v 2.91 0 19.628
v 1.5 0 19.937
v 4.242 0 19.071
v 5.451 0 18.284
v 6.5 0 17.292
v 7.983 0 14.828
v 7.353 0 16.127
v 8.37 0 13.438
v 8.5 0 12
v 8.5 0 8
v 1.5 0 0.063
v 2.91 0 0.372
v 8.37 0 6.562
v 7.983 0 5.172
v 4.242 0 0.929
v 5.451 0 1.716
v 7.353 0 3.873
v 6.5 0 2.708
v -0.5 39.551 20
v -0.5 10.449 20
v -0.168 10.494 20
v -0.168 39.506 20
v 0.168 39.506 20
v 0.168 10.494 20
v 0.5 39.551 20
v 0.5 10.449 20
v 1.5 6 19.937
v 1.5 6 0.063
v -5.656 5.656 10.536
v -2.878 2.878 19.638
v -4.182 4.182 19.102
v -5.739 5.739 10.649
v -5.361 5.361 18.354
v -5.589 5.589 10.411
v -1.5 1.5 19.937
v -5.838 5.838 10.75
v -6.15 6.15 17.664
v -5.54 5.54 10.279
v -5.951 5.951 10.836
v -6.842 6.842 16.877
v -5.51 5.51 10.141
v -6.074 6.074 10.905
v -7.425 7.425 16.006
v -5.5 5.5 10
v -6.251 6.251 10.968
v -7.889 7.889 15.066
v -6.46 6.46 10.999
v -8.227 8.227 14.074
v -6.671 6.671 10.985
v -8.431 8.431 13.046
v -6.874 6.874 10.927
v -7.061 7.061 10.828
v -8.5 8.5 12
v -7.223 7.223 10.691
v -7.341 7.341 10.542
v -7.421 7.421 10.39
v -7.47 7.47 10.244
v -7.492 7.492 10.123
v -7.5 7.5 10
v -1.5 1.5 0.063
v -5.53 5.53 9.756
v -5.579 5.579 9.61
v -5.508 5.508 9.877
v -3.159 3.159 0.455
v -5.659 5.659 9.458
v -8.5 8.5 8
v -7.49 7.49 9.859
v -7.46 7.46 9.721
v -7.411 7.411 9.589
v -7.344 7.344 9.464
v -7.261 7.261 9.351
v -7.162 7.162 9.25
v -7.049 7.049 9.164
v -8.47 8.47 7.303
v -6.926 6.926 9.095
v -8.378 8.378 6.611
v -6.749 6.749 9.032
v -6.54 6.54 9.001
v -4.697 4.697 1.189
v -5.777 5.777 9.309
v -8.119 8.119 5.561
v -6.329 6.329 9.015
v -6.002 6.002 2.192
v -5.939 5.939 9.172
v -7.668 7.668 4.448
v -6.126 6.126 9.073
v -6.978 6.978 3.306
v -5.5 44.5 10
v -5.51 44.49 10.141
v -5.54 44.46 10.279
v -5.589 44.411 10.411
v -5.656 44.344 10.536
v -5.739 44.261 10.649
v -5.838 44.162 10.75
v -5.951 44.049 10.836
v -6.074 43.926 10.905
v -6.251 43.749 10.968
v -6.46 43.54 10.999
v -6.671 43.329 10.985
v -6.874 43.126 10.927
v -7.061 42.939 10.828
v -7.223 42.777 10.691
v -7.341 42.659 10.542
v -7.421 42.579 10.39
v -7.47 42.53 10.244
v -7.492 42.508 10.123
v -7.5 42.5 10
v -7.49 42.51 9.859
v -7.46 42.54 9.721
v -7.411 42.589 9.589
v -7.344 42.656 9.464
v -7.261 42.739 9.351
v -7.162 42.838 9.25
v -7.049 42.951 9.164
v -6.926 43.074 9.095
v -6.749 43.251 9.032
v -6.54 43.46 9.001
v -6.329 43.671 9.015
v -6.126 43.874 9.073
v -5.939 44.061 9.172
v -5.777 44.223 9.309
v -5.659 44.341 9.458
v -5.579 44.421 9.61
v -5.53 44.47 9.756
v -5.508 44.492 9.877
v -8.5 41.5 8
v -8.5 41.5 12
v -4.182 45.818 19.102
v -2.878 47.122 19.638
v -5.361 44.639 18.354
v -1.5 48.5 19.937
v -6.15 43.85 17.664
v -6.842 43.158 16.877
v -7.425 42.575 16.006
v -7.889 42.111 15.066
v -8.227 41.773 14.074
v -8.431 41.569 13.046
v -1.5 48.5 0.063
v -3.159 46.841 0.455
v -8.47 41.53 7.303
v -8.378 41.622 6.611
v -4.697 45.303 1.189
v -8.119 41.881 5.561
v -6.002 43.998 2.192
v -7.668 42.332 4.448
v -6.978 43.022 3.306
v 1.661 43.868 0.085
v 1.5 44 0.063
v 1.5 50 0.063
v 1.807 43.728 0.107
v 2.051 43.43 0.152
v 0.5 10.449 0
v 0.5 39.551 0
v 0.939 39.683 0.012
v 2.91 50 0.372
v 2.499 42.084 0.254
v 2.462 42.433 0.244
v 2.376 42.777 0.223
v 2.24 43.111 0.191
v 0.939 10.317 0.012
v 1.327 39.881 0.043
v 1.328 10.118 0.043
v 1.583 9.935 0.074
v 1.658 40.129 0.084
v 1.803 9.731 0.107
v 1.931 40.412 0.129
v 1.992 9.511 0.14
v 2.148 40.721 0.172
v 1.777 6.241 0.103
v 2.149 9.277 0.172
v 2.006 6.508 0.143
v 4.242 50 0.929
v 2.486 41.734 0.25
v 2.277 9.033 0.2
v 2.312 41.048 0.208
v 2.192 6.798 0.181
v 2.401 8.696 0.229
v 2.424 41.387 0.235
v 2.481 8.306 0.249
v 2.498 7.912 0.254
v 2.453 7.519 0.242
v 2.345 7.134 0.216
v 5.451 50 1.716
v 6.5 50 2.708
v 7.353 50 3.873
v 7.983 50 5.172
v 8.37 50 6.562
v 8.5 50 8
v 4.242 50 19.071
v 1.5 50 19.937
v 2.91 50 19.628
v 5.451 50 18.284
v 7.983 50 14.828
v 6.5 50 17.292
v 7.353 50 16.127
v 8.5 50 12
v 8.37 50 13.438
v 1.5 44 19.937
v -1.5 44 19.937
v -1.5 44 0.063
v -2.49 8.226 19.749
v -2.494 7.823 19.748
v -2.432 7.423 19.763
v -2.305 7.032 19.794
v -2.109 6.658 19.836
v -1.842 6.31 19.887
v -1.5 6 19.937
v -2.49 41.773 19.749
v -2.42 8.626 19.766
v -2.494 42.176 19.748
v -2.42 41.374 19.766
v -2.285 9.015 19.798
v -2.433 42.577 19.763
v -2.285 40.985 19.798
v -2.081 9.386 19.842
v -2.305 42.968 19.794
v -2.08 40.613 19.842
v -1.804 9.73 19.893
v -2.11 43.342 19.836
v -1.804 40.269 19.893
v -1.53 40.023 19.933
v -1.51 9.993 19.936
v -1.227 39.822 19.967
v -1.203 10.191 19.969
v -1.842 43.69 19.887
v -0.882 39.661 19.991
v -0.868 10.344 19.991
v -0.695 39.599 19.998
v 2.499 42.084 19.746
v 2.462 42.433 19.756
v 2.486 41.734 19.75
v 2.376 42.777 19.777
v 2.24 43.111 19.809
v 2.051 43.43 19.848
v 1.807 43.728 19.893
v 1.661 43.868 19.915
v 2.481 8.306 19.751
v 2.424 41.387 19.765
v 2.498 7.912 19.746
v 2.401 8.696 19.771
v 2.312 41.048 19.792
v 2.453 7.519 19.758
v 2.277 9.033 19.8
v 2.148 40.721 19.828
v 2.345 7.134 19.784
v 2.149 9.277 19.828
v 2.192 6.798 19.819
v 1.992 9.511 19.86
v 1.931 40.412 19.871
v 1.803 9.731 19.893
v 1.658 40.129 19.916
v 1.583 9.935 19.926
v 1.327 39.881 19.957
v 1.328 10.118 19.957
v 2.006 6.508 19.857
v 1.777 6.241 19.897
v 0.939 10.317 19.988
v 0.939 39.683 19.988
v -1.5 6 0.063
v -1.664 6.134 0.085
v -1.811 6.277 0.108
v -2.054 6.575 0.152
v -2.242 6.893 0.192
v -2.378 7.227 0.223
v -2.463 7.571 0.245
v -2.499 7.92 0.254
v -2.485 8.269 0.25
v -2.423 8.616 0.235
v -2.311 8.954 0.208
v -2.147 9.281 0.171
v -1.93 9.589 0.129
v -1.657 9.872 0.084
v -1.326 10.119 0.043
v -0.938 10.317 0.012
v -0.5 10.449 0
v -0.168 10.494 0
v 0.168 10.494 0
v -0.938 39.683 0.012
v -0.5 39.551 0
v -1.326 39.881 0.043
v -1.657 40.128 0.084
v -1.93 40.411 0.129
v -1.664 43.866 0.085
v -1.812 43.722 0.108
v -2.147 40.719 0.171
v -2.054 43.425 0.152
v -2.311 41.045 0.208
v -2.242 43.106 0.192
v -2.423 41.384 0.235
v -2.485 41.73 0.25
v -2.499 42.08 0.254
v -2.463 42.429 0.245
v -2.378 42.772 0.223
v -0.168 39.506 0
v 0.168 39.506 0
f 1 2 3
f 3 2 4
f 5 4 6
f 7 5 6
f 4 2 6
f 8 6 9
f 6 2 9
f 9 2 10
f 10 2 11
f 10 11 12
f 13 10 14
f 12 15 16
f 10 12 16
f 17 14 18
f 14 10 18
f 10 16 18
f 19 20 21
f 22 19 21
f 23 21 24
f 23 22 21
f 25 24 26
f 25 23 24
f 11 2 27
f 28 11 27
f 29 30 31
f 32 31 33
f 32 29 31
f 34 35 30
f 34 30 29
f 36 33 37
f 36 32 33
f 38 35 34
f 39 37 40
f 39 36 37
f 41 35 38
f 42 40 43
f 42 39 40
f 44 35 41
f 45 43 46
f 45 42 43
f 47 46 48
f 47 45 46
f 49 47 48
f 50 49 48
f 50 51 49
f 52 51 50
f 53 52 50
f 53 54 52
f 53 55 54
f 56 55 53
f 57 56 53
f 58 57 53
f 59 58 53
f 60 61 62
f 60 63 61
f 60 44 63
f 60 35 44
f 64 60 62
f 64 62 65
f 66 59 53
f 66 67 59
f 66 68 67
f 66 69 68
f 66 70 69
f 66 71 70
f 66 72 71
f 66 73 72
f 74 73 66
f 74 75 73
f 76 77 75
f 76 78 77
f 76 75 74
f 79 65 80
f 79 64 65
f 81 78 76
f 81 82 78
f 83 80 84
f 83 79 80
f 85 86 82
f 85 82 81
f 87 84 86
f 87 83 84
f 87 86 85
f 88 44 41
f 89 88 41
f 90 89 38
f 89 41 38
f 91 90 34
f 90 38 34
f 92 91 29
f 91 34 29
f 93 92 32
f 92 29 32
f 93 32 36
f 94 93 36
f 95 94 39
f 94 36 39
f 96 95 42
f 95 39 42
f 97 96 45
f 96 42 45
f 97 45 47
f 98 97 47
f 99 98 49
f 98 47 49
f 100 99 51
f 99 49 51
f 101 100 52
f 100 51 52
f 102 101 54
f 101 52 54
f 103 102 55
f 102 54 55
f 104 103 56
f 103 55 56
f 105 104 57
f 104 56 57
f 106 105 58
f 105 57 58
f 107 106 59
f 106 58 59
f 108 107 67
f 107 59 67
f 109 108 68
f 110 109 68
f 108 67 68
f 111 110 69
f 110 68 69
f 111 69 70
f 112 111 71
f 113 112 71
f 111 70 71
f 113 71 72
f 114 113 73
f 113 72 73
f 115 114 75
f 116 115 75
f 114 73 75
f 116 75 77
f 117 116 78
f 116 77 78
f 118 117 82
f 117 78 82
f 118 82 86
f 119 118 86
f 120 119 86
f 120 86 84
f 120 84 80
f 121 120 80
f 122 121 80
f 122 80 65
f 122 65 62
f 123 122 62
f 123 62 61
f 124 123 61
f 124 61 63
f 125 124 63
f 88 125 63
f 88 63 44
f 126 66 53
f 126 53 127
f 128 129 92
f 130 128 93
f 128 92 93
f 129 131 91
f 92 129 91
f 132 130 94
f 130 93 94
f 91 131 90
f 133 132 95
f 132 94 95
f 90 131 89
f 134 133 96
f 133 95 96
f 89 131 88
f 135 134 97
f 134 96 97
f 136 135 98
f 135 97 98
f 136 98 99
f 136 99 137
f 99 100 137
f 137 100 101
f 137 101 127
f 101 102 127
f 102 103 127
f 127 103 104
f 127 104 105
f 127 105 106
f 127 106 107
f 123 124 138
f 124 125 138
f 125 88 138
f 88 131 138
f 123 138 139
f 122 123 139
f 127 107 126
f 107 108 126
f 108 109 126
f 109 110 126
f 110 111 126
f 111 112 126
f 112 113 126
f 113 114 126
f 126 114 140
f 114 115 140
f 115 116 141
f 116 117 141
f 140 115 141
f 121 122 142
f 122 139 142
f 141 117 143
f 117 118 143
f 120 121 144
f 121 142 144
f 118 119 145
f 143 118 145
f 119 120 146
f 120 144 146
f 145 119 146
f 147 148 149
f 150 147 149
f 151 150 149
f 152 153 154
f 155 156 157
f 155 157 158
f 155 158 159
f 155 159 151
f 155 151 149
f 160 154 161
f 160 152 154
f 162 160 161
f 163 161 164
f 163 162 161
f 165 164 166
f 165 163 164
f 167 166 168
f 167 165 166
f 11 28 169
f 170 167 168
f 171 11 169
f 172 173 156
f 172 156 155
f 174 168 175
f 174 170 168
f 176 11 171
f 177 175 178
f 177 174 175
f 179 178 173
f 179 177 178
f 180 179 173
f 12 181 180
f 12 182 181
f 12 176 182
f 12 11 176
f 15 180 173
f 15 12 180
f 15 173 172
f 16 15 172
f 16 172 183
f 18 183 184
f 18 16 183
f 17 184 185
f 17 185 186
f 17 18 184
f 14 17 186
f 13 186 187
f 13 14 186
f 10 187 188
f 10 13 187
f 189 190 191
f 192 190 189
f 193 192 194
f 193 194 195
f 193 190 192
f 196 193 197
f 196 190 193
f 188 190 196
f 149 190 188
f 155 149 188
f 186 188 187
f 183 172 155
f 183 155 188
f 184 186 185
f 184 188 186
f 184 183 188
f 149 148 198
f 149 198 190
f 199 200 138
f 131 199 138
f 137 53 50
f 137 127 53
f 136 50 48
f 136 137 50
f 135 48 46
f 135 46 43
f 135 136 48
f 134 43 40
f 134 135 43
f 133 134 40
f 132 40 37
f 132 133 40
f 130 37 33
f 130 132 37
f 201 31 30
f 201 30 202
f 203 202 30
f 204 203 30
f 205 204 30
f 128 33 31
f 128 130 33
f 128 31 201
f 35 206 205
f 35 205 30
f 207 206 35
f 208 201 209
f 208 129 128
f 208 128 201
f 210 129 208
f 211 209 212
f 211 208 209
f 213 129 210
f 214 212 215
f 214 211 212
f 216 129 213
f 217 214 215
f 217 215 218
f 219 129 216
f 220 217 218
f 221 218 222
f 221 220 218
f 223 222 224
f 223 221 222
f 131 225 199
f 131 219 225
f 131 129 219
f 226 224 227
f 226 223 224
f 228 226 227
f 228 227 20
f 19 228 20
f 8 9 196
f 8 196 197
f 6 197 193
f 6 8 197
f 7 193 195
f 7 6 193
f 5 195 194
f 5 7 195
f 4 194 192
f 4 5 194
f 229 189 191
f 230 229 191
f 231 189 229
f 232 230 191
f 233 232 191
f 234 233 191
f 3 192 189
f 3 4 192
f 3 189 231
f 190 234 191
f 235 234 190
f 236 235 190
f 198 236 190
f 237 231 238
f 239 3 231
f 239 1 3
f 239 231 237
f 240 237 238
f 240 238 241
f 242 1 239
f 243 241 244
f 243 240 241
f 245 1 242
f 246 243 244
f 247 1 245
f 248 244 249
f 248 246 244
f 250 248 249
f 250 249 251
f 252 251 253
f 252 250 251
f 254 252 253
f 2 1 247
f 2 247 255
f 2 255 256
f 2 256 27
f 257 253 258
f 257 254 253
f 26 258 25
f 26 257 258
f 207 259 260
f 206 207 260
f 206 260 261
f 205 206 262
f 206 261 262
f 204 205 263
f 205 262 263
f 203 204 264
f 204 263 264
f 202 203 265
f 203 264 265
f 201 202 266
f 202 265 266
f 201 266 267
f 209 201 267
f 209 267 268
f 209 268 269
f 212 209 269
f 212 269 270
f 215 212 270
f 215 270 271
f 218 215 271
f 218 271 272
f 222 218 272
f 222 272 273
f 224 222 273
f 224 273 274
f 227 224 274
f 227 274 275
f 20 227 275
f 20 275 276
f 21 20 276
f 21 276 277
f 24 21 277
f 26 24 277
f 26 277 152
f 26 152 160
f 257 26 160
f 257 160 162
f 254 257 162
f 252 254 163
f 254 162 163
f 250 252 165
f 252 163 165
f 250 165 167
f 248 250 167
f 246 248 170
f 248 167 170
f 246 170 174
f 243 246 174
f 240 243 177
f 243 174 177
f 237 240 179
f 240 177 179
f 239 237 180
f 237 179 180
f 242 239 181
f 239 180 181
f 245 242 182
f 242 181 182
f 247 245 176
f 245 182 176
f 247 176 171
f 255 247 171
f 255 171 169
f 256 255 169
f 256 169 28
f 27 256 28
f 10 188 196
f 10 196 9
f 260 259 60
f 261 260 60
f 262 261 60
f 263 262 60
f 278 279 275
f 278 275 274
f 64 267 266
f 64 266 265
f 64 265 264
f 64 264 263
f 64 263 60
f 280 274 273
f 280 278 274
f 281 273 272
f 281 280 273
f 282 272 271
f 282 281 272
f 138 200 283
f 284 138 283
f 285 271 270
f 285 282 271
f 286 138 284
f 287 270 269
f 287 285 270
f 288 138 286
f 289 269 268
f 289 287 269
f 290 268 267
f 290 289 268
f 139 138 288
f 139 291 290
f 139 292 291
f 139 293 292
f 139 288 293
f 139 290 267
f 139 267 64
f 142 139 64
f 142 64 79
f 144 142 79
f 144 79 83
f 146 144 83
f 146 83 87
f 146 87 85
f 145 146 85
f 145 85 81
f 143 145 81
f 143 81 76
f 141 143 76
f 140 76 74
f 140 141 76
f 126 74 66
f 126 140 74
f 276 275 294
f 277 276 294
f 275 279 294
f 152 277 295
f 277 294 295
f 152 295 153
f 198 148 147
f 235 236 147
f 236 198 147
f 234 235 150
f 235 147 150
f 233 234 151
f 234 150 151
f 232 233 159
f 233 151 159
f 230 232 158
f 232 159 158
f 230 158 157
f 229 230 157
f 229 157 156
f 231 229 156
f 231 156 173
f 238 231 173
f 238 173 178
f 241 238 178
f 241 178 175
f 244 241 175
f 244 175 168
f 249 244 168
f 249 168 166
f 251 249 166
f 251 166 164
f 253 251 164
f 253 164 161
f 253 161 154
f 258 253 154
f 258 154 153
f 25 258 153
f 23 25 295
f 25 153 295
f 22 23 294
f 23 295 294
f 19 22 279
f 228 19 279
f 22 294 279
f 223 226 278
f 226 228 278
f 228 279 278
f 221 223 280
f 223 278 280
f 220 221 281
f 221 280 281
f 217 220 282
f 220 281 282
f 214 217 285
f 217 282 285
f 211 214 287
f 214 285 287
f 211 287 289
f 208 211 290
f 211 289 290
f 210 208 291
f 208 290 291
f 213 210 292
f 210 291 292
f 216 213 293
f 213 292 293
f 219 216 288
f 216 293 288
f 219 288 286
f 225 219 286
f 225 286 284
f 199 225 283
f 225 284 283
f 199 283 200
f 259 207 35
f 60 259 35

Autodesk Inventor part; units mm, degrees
ref_plane "YZ Plane" through (0, 0, 0) normal (1, 0, 0) x (0, 1, 0)
ref_plane "XZ Plane" through (0, 0, 0) normal (0, 1, 0) x (-1, 0, 0)
ref_plane "XY Plane" through (0, 0, 0) normal (0, 0, 1) x (1, 0, 0)
sketch "Sketch1" plane through (0, 0, 0) normal (0, 0, 1) x (1, 0, 0)
  line L0 (0, 0) -> (2.5, 0)
  line L1 (2.5, 0) -> (2.5, 50)
  line L2 (2.5, 50) -> (-2.5, 50)
  line L3 (-2.5, 50) -> (-2.5, 0)
  circle A0 centre (0, 0) radius 8.5
  line L4 (0, 50) -> (8.5, 50) construction
  circle A1 centre (0, 50) radius 8.5
  line L5 (-8.5, 0) -> (-8.5, 50)
  line L6 (8.5, 50) -> (8.5, 0)
  line L7 (0, 50) -> (8.5, 50)
  line L8 (0, 50) -> (-8.5, 41.5)
  line L9 (0, 50) -> (12.0208, 50) construction
  line L10 (0, 0) -> (8.5, 0)
  line L11 (0, 0) -> (-8.5, 8.5)
  line L12 (0, 0) -> (12.0208, 0) construction
  dimension "d9" = 17
  dimension "d1" = 2.5
  dimension "d2" = 50
  dimension "d3" = 5
  dimension "d5" = 17
  dimension "d10" = 2.5
  dimension "d11" = 0
  dimension "d12" = 135
  dimension "d13" = 135
extrude "Extrusion1" add sketch "Sketch1" along normal blind 20 contours L11 L3 A0 L1 L0 | L1 A0 L10 | L11 A0 L3 | A0 L3 A1 L1 | L1 A1 L6 A0 | A0 L11 L5 L8 A1 L3 | A1 L3 L8 L2 L1 | L1 L7 A1 | A1 L8 L3
sketch "Sketch2" plane through (0, 0, 0) normal (0, 0, -1) x (-1, 0, 0)
  line L0 (0, 0) -> (-8.5, 0) projected
  line L1 (0, 0) -> (0, 8)
  circle A0 centre (0, 8) radius 2.5
  line L2 (8.5, 8.5) -> (0, 0) projected
  line L3 (0, 0) -> (-1.5, 0)
  line L4 (-1.5, 0) -> (-1.5, 8)
  line L5 (-1.5, 8) -> (1.5, 8)
  line L6 (1.5, 8) -> (1.5, 0)
  line L7 (1.5, 0) -> (0, 0)
  line L8 (0, 50) -> (8.5, 41.5) projected
  line L9 (0, 50) -> (0, 42)
  line L10 (0, 42) -> (-1.5, 42)
  line L11 (-1.5, 42) -> (-1.5, 50)
  line L12 (-8.5, 50) -> (0, 50) projected
  line L13 (0, 42) -> (1.5, 42)
  line L14 (1.5, 42) -> (1.5, 50)
  line L15 (1.5, 50) -> (0, 50)
  circle A1 centre (0, 42) radius 2.5
  point P0 (1.5, 45)
  point P1 (-1.5, 44)
  point P2 (1.5, 44)
  point P3 (-1.5, 6)
  point P4 (1.5, 6)
  dimension "d16" = 8
  dimension "d17" = 5
  dimension "d18" = 1.5
  dimension "d19" = 3
  dimension "d20" = 8
  dimension "d21" = 1.5
  dimension "d22" = 1.5
  dimension "d23" = 5
extrude "Extrusion2" cut sketch "Sketch2" against normal through all
fillet "Fillet1" radius 8 4 edges at (8.5, 25, 0) (8.5, 25, 20) (-8.5, 25, 0) (-8.5, 25, 20)
sketch "Sketch4" plane through (1.5, 0, 0.0627) normal (0, -1, 0) x (1, 0, 0)
  line L0 (-10, 7.9373) -> (-10, 11.9373) projected
  line L1 (-10, 9.9373) -> (-8, 9.9373)
  circle A0 centre (-8, 9.9373) radius 1
  point P0 (-1.5, -0.0627)
  dimension "d31" = 2
  dimension "d32" = 2
extrude "Extrusion4" cut sketch "Sketch4" against normal through all
properties part number "ring_f1"
